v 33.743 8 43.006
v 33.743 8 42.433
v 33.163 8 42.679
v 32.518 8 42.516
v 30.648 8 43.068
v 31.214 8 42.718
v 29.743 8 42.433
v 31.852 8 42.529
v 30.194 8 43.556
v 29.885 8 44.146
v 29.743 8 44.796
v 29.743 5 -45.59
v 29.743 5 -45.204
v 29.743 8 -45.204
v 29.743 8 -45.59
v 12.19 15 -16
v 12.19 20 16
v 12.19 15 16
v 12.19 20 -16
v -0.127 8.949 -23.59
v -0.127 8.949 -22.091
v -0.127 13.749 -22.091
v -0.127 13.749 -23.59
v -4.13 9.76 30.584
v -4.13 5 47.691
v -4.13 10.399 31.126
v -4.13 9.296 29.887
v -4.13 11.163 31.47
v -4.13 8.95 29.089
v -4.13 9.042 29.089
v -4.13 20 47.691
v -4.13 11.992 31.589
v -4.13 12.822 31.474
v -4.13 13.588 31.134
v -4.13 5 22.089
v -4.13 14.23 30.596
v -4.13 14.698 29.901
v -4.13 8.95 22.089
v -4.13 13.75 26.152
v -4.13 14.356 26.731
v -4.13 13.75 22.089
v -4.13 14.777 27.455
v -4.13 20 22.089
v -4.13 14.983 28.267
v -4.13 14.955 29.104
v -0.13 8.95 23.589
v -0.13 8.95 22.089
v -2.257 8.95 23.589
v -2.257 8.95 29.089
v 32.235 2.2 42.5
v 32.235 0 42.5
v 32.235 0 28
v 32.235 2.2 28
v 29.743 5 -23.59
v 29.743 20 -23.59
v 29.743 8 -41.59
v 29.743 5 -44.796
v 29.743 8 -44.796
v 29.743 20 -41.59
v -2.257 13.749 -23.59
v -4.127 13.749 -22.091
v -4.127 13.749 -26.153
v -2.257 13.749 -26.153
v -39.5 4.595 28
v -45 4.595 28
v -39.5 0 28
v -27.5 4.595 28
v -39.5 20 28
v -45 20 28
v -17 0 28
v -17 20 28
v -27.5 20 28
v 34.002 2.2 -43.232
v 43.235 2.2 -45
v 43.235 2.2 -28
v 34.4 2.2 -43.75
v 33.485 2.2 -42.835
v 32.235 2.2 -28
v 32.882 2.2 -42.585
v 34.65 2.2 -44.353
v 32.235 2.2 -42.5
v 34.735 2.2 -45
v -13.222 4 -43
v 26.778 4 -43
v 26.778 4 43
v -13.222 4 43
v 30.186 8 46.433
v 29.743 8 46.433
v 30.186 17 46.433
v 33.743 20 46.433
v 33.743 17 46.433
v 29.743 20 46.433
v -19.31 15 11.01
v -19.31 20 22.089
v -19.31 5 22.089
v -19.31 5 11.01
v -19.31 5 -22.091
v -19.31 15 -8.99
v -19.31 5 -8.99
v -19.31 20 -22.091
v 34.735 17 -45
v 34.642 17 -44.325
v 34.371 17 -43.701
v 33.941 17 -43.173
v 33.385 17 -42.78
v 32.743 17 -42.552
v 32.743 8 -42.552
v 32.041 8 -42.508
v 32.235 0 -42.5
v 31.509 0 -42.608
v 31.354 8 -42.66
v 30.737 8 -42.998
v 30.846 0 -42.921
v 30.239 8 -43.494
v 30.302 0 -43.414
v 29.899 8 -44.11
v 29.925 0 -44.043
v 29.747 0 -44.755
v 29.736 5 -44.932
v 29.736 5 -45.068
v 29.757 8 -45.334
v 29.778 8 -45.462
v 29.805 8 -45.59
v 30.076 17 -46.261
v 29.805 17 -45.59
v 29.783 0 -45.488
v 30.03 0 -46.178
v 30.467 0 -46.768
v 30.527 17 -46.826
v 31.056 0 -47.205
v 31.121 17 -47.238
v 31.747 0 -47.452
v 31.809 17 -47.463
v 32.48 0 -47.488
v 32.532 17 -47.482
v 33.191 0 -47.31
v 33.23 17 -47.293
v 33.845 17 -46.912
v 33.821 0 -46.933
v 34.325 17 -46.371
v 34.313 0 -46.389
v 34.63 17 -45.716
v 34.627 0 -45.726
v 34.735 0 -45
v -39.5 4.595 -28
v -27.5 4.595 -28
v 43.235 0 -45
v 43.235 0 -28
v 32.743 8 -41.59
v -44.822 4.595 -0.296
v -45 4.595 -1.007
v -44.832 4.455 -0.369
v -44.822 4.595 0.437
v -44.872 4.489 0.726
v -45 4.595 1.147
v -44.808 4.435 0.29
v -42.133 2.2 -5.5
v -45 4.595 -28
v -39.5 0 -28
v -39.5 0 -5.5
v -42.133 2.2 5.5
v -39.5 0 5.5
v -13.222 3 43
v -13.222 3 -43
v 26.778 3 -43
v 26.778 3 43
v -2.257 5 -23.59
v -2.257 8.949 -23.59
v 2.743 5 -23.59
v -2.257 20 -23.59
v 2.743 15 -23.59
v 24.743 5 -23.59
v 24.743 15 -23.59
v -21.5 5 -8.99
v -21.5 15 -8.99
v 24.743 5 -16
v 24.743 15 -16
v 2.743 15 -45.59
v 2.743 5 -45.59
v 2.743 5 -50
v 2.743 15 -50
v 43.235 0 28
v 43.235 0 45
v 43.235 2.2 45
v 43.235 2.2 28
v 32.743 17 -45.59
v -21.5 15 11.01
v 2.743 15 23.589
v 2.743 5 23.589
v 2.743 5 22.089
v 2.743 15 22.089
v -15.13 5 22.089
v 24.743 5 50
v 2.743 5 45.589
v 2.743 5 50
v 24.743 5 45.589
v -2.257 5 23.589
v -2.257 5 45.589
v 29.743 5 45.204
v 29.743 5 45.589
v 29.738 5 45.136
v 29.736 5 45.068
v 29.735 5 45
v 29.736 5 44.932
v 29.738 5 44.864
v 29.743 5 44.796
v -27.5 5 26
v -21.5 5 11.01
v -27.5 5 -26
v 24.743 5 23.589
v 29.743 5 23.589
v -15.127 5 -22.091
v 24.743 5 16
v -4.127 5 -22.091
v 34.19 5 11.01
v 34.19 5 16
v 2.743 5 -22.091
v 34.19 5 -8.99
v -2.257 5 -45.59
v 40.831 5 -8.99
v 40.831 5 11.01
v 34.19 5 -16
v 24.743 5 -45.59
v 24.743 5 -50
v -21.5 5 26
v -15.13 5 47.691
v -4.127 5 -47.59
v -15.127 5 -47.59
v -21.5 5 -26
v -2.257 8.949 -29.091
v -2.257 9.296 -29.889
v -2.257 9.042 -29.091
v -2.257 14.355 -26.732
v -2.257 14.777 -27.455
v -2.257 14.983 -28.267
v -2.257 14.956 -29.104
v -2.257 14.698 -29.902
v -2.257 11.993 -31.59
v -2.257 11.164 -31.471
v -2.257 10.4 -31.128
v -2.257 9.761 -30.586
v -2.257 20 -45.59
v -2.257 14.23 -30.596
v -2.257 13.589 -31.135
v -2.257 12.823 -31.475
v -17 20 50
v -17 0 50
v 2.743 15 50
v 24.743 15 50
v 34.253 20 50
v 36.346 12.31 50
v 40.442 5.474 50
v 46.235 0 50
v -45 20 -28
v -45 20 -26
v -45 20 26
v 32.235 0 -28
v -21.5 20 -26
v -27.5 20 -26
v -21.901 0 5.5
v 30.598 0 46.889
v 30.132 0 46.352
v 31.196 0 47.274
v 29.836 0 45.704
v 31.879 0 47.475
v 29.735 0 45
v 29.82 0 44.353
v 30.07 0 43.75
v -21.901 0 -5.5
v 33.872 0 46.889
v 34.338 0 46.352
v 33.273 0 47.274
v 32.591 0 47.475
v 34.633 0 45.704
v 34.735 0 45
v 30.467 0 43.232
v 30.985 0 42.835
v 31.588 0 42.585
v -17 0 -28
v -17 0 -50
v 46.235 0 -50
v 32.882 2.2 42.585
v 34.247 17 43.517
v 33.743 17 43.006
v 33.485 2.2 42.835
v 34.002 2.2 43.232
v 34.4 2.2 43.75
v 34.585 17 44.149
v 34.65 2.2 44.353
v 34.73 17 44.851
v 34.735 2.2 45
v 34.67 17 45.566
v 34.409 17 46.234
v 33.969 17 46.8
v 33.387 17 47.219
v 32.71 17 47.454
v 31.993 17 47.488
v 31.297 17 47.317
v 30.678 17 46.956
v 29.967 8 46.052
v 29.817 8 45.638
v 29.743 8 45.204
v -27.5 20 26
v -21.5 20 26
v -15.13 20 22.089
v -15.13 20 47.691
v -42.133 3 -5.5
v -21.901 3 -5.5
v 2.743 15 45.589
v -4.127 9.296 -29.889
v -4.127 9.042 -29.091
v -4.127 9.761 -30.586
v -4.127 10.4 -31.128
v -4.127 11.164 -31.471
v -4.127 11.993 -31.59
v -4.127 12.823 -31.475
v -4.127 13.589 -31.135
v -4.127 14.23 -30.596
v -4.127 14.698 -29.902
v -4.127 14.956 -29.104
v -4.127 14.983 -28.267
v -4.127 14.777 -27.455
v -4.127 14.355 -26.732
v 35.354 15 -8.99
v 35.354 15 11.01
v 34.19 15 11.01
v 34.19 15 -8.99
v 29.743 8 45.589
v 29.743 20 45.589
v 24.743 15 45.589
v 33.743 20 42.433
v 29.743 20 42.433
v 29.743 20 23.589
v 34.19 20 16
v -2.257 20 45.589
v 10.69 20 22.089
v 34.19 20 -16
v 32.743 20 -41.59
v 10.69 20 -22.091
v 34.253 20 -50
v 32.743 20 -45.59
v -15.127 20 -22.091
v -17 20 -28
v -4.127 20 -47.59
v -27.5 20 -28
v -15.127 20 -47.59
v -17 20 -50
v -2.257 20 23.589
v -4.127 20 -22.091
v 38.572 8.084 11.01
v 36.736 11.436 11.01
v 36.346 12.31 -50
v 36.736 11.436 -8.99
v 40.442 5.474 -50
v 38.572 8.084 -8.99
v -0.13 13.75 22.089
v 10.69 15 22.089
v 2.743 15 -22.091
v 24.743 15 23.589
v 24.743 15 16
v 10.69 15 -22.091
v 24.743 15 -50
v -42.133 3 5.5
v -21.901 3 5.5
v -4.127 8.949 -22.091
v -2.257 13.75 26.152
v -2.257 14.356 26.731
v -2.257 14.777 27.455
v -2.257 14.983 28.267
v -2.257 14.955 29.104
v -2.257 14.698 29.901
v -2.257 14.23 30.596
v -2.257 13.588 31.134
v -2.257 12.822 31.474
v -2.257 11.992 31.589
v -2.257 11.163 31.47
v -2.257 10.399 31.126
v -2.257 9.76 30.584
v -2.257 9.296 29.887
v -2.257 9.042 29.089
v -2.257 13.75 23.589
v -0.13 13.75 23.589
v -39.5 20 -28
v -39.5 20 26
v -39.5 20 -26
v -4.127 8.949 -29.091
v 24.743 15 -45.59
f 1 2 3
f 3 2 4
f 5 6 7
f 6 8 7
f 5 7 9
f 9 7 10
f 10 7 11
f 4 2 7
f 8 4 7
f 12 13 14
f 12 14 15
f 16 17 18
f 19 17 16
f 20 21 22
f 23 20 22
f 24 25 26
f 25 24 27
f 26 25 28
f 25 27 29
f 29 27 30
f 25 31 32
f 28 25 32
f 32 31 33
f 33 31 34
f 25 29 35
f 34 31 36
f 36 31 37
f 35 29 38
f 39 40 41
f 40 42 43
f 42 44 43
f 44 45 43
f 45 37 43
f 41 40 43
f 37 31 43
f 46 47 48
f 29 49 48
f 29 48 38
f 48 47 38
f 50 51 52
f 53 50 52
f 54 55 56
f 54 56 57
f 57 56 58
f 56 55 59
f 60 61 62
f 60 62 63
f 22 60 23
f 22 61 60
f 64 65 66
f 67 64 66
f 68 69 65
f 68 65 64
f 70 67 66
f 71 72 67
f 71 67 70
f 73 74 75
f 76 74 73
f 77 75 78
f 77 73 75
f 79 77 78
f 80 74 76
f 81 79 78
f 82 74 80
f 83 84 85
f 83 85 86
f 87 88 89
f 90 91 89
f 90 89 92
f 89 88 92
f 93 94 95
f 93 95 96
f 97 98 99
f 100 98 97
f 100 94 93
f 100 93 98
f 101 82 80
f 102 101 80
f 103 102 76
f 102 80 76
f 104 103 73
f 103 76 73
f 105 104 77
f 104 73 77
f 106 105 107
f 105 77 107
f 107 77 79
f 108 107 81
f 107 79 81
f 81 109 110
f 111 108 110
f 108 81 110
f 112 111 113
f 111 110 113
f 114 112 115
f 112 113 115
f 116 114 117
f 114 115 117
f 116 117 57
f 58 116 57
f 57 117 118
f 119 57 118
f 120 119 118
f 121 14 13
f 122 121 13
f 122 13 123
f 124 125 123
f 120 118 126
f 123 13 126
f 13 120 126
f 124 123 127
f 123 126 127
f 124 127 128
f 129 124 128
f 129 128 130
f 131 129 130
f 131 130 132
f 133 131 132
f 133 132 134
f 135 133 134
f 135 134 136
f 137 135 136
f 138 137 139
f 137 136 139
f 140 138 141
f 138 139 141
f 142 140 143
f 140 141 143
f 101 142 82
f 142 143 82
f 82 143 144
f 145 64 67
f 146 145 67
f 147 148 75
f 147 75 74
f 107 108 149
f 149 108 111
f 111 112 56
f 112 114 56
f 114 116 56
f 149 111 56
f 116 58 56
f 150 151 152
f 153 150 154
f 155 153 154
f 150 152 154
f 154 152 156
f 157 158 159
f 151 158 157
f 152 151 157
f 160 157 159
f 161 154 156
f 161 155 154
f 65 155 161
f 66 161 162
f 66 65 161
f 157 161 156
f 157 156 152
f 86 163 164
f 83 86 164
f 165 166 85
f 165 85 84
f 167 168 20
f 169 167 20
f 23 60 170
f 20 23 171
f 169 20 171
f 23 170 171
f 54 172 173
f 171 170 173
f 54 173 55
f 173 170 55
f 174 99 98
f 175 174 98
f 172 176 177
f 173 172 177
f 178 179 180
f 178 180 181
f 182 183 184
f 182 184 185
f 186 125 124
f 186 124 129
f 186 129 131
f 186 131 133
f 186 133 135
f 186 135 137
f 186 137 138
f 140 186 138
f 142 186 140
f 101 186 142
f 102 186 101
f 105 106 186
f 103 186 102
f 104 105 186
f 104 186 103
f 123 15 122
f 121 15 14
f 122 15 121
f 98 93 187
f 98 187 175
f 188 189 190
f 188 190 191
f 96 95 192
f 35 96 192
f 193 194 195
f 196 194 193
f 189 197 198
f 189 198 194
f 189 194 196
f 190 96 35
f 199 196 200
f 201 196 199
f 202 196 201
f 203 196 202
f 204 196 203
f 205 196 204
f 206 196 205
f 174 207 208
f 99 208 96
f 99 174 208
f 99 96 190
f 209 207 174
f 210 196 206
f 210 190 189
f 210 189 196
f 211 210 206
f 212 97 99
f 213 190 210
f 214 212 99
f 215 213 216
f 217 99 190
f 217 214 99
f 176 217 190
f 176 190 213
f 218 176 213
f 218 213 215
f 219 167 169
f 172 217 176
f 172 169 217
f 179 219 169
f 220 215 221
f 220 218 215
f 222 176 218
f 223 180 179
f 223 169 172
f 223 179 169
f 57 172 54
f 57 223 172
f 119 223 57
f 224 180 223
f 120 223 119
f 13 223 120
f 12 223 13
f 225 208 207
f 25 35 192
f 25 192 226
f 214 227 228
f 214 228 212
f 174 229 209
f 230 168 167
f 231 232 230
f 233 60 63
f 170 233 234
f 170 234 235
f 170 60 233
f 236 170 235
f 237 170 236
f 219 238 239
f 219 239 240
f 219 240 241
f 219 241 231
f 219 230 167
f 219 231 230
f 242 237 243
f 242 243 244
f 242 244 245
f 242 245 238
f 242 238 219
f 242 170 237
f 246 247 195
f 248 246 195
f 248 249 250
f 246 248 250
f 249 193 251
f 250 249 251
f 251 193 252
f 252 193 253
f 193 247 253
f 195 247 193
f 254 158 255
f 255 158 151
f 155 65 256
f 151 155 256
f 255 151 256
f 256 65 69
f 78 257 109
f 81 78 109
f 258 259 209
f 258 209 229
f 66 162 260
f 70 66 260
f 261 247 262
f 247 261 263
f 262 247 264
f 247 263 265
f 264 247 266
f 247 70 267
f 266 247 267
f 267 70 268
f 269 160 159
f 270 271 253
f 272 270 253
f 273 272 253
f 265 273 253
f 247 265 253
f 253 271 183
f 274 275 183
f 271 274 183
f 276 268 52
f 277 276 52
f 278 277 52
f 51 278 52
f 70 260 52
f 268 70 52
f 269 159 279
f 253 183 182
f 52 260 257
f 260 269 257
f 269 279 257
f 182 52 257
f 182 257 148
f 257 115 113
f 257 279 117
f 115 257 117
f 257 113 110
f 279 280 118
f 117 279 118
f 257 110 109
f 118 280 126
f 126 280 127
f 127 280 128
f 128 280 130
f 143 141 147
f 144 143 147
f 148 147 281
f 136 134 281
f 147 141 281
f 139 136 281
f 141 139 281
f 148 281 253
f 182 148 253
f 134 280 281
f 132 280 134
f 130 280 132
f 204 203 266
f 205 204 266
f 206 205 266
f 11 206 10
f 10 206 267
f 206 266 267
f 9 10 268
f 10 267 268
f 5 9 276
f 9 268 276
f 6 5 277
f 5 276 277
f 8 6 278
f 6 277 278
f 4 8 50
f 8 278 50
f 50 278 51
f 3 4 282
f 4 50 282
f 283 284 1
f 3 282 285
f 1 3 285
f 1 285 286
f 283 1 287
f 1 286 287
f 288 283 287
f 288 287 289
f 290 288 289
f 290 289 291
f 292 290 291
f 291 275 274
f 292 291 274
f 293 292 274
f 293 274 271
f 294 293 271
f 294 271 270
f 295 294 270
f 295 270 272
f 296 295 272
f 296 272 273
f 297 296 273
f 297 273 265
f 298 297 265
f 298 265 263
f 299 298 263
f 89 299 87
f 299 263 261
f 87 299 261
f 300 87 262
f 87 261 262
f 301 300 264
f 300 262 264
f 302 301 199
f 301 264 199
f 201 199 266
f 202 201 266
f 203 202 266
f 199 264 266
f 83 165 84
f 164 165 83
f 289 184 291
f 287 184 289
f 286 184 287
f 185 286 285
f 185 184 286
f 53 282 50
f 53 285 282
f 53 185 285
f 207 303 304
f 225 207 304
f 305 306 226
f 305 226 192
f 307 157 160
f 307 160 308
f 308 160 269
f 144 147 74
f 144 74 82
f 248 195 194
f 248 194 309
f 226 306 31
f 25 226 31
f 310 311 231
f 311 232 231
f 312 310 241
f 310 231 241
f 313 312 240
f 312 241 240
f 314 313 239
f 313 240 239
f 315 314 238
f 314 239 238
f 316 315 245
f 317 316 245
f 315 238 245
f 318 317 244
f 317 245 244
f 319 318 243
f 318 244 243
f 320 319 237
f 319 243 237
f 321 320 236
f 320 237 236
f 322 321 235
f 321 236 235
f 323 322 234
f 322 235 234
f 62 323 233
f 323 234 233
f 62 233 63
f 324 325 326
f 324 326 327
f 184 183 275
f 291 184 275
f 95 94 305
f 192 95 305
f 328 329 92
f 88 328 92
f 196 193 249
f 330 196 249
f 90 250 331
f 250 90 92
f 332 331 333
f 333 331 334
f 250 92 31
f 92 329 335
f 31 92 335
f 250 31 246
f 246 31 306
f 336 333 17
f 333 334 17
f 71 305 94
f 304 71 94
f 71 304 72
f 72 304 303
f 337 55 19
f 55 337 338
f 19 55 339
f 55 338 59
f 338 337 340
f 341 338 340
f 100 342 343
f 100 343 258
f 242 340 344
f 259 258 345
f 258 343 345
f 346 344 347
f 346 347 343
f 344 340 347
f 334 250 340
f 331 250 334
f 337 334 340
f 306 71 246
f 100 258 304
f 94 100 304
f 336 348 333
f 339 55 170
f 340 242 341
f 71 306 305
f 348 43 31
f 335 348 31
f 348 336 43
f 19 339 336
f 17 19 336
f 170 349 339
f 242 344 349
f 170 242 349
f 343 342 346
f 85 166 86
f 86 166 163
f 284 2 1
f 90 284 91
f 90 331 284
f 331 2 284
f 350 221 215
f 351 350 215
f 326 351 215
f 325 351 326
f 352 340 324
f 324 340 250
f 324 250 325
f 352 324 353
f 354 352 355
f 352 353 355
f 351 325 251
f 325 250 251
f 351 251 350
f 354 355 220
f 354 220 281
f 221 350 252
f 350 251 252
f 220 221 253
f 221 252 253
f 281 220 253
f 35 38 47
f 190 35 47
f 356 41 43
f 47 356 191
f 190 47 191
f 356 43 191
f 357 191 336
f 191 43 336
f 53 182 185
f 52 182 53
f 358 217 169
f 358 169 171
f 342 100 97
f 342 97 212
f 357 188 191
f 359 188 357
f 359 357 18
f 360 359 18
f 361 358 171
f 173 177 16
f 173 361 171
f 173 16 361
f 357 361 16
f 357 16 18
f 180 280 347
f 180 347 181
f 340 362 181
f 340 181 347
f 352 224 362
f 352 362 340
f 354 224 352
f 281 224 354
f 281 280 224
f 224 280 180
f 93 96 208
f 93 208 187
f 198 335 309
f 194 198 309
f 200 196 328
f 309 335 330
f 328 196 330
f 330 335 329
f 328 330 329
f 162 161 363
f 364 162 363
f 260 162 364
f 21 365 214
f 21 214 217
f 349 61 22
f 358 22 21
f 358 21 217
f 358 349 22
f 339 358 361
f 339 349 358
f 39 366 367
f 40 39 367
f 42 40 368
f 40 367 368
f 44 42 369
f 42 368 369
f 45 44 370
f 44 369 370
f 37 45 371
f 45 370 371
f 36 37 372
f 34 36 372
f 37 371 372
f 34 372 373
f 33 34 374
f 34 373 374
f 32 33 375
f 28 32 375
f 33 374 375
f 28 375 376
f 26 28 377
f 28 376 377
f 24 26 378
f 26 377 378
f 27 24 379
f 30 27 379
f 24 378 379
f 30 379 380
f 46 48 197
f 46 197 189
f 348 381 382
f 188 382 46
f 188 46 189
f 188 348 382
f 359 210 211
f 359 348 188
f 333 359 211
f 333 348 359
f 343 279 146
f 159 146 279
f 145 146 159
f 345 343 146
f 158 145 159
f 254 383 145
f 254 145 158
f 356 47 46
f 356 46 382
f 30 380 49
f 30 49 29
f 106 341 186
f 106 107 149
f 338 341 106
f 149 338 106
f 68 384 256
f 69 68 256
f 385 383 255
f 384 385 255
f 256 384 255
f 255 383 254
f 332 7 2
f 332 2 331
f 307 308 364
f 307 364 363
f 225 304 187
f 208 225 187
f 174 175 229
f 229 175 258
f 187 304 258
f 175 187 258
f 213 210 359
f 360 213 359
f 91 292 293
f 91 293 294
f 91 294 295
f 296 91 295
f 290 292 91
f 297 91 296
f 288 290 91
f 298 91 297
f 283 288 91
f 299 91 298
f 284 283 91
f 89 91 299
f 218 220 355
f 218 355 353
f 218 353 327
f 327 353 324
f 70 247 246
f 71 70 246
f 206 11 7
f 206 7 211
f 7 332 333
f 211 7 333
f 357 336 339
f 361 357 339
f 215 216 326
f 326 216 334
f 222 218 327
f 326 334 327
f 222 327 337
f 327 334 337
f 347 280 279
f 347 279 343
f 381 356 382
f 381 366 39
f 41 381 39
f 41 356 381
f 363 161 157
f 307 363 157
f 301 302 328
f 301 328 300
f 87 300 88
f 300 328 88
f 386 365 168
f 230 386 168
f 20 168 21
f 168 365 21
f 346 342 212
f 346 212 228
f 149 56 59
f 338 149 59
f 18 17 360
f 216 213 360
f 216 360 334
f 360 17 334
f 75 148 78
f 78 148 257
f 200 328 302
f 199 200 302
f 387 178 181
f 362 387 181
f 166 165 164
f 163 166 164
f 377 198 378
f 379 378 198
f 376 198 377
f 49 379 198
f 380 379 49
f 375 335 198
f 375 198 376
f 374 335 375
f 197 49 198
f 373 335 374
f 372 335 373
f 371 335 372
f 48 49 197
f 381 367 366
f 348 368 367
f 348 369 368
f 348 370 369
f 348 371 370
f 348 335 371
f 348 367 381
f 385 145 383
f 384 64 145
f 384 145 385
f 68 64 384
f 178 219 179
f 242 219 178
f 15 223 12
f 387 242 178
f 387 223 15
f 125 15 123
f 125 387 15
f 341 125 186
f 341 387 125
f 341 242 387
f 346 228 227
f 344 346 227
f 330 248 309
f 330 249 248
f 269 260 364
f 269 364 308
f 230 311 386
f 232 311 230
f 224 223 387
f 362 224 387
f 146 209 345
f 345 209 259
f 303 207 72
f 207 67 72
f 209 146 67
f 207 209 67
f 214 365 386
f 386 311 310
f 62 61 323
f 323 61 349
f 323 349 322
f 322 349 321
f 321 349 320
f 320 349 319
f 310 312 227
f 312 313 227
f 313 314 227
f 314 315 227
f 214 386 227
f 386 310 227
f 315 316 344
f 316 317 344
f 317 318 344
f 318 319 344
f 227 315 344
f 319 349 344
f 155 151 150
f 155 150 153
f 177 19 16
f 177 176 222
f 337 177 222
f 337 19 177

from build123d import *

# Parameters (mm, degrees)
SKETCH1_W           = 100
SKETCH1_H           = 100
BOSS_EXTRUDE2_DEPTH = 40
SKETCH3_W           = 20
SKETCH3_H           = 10
CUT_EXTRUDE3_DEPTH  = 100
SKETCH4_R           = 29.179887526
CUT_EXTRUDE5_DEPTH  = 100
SKETCH5_W           = 60
SKETCH5_H           = 20
CUT_EXTRUDE6_DEPTH  = 100
SKETCH6_W           = 22
SKETCH6_H           = 32
CUT_EXTRUDE7_DEPTH  = 15
SKETCH7_W           = 22
SKETCH7_H           = 10
CUT_EXTRUDE9_DEPTH  = 100
SKETCH9_W           = 32
SKETCH9_H           = 22
CUT_EXTRUDE10_DEPTH = 15
SKETCH10_W          = 32
SKETCH10_H          = 22
CUT_EXTRUDE11_DEPTH = 15
SKETCH11_W          = 33
SKETCH11_H          = 33
CUT_EXTRUDE13_DEPTH = 22
SKETCH12_W          = 33
SKETCH12_H          = 33
CUT_EXTRUDE14_DEPTH = 22
SKETCH13_W          = 30
SKETCH13_H          = 20
CUT_EXTRUDE15_DEPTH = 100
SKETCH14_W          = 12
SKETCH14_H          = 16
CUT_EXTRUDE17_DEPTH = 80
SKETCH15_W          = 24
SKETCH15_H          = 52
CUT_EXTRUDE18_DEPTH = 15
SKETCH16_W          = 30
SKETCH16_H          = 44.18
CUT_EXTRUDE19_DEPTH = 15
SKETCH17_W          = 11
SKETCH17_H          = 26
CUT_EXTRUDE20_DEPTH = 15
SKETCH18_W          = 11
SKETCH18_H          = 26
CUT_EXTRUDE22_DEPTH = 15
SKETCH19_W          = 11
SKETCH19_H          = 17
CUT_EXTRUDE26_DEPTH = 2.2
SKETCH20_R          = 2.5
CUT_EXTRUDE32_DEPTH = 17
SKETCH21_W          = 4
SKETCH21_H          = 12
CUT_EXTRUDE33_DEPTH = 4
SKETCH23_W          = 11
SKETCH23_H          = 17
CUT_EXTRUDE34_DEPTH = 2.2
SKETCH24_R          = 2.5
CUT_EXTRUDE35_DEPTH = 17
SKETCH25_W          = 4
SKETCH25_H          = 12
CUT_EXTRUDE36_DEPTH = 3
SKETCH26_R          = 3
CUT_EXTRUDE37_DEPTH = 3
SKETCH27_R          = 3
CUT_EXTRUDE38_DEPTH = 3
SKETCH28_W          = 17
SKETCH28_H          = 11
CUT_EXTRUDE39_DEPTH = 2.2
SKETCH29_R          = 3
CUT_EXTRUDE40_DEPTH = 4
SKETCH30_W          = 4
SKETCH30_H          = 4.8
CUT_EXTRUDE43_DEPTH = 7
SKETCH31_W          = 4
SKETCH31_H          = 4.8
CUT_EXTRUDE44_DEPTH = 7
CUT_EXTRUDE45_DEPTH = 100
SKETCH34_W          = 5
SKETCH34_H          = 20
CUT_EXTRUDE46_DEPTH = 100
CUT_EXTRUDE47_DEPTH = 100
SKETCH36_W          = 5.5
SKETCH36_H          = 15.404877169
BOSS_EXTRUDE3_DEPTH = 55
SKETCH37_W          = 20.232210009
SKETCH37_H          = 11
CUT_EXTRUDE48_DEPTH = 3
SKETCH38_W          = 40
SKETCH38_H          = 86
CUT_EXTRUDE53_DEPTH = 1


with BuildPart() as part:
    # Sketch1 → Boss-Extrude2 (new body)
    with BuildSketch(Plane(origin=(0, 0, 0), x_dir=(1, 0, 0), z_dir=(0, 1, 0))):
        Rectangle(SKETCH1_W, SKETCH1_H)
    extrude(amount=BOSS_EXTRUDE2_DEPTH)

    # Sketch3 → Cut-Extrude3 (cut)
    with BuildSketch(Plane(origin=(50, 0, 0), x_dir=(0, 0, -1), z_dir=(1, 0, 0))):
        with Locations((-1.010205144, 10)):
            Rectangle(SKETCH3_W, SKETCH3_H)
    extrude(amount=-CUT_EXTRUDE3_DEPTH, mode=Mode.SUBTRACT)

    # Sketch4 → Cut-Extrude5 (cut)
    with BuildSketch(Plane.XY.offset(50)):
        with Locations((63.191438408, 23.747323898)):
            Circle(SKETCH4_R)
    extrude(amount=-CUT_EXTRUDE5_DEPTH, mode=Mode.SUBTRACT)

    # Sketch5 → Cut-Extrude6 (cut)
    with BuildSketch(Plane.XY.offset(50)):
        with Locations((8.956827713, 30)):
            Rectangle(SKETCH5_W, SKETCH5_H)
    extrude(amount=-CUT_EXTRUDE6_DEPTH, mode=Mode.SUBTRACT)

    # Sketch6 → Cut-Extrude7 (cut)
    with BuildSketch(Plane(origin=(0, 20, 0), x_dir=(1, 0, 0), z_dir=(0, 1, 0))):
        with Locations((23.190442589, 0)):
            Rectangle(SKETCH6_W, SKETCH6_H)
    extrude(amount=-CUT_EXTRUDE7_DEPTH, mode=Mode.SUBTRACT)

    # Sketch7 → Cut-Extrude9 (cut)
    with BuildSketch(Plane.XY.offset(50)):
        with Locations((13.743053617, 10)):
            Rectangle(SKETCH7_W, SKETCH7_H)
    extrude(amount=-CUT_EXTRUDE9_DEPTH, mode=Mode.SUBTRACT)

    # Sketch9 → Cut-Extrude10 (cut)
    with BuildSketch(Plane(origin=(0, 20, 0), x_dir=(1, 0, 0), z_dir=(0, 1, 0))):
        with Locations((13.743053617, -34.588860887)):
            Rectangle(SKETCH9_W, SKETCH9_H)
    extrude(amount=-CUT_EXTRUDE10_DEPTH, mode=Mode.SUBTRACT)

    # Sketch10 → Cut-Extrude11 (cut)
    with BuildSketch(Plane(origin=(0, 20, 0), x_dir=(1, 0, 0), z_dir=(0, 1, 0))):
        with Locations((13.743053617, 34.59)):
            Rectangle(SKETCH10_W, SKETCH10_H)
    extrude(amount=-CUT_EXTRUDE11_DEPTH, mode=Mode.SUBTRACT)

    # Sketch11 → Cut-Extrude13 (cut)
    with BuildSketch(Plane.XY.offset(50)):
        with Locations((-33.5, 16.5)):
            Rectangle(SKETCH11_W, SKETCH11_H)
    extrude(amount=-CUT_EXTRUDE13_DEPTH, mode=Mode.SUBTRACT)

    # Sketch12 → Cut-Extrude14 (cut)
    with BuildSketch(Plane(origin=(0, 0, -50), x_dir=(-1, 0, 0), z_dir=(0, 0, -1))):
        with Locations((33.5, 16.5)):
            Rectangle(SKETCH12_W, SKETCH12_H)
    extrude(amount=-CUT_EXTRUDE14_DEPTH, mode=Mode.SUBTRACT)

    # Sketch13 → Cut-Extrude15 (cut)
    with BuildSketch(Plane(origin=(0, 0, -50), x_dir=(-1, 0, 0), z_dir=(0, 0, -1))):
        with Locations((36.043172287, 30)):
            Rectangle(SKETCH13_W, SKETCH13_H)
    extrude(amount=-CUT_EXTRUDE15_DEPTH, mode=Mode.SUBTRACT)

    # Sketch14 → Cut-Extrude17 (cut)
    with BuildSketch(Plane.XY.offset(28)):
        with Locations((-33.5, 12.595122831)):
            Rectangle(SKETCH14_W, SKETCH14_H)
    extrude(amount=-CUT_EXTRUDE17_DEPTH, mode=Mode.SUBTRACT)

    # Sketch15 → Cut-Extrude18 (cut)
    with BuildSketch(Plane(origin=(0, 20, 0), x_dir=(1, 0, 0), z_dir=(0, 1, 0))):
        with Locations((-33.5, 0)):
            Rectangle(SKETCH15_W, SKETCH15_H)
    extrude(amount=-CUT_EXTRUDE18_DEPTH, mode=Mode.SUBTRACT)

    # Sketch16 → Cut-Extrude19 (cut)
    with BuildSketch(Plane(origin=(0, 20, 0), x_dir=(1, 0, 0), z_dir=(0, 1, 0))):
        with Locations((-4.309557411, 0.001139113)):
            Rectangle(SKETCH16_W, SKETCH16_H)
    extrude(amount=-CUT_EXTRUDE19_DEPTH, mode=Mode.SUBTRACT)

    # Sketch17 → Cut-Extrude20 (cut)
    with BuildSketch(Plane(origin=(0, 20, 0), x_dir=(1, 0, 0), z_dir=(0, 1, 0))):
        with Locations((-9.626946383, 34.59)):
            Rectangle(SKETCH17_W, SKETCH17_H)
    extrude(amount=-CUT_EXTRUDE20_DEPTH, mode=Mode.SUBTRACT)

    # Sketch18 → Cut-Extrude22 (cut)
    with BuildSketch(Plane(origin=(0, 20, 0), x_dir=(1, 0, 0), z_dir=(0, 1, 0))):
        with Locations((-9.63, -34.691148393)):
            Rectangle(SKETCH18_W, SKETCH18_H)
    extrude(amount=-CUT_EXTRUDE22_DEPTH, mode=Mode.SUBTRACT)

    # Sketch19 → Cut-Extrude26 (cut)
    with BuildSketch(Plane(origin=(0, 0, 0), x_dir=(-1, 0, 0), z_dir=(0, -1, 0))):
        with Locations((-37.734715737, -36.5)):
            Rectangle(SKETCH19_W, SKETCH19_H)
    extrude(amount=-CUT_EXTRUDE26_DEPTH, mode=Mode.SUBTRACT)

    # Sketch20 → Cut-Extrude32 (cut)
    with BuildSketch(Plane(origin=(0, 0, 0), x_dir=(-1, 0, 0), z_dir=(0, -1, 0))):
        with Locations((-32.234715737, -45)):
            Circle(SKETCH20_R)
    extrude(amount=-CUT_EXTRUDE32_DEPTH, mode=Mode.SUBTRACT)

    # Sketch21 → Cut-Extrude33 (cut)
    with BuildSketch(Plane.ZY.offset(-29.743053617)):
        with Locations((44.433350435, 14)):
            Rectangle(SKETCH21_W, SKETCH21_H)
    extrude(amount=-CUT_EXTRUDE33_DEPTH, mode=Mode.SUBTRACT)

    # Sketch23 → Cut-Extrude34 (cut)
    with BuildSketch(Plane(origin=(0, 0, 0), x_dir=(-1, 0, 0), z_dir=(0, -1, 0))):
        with Locations((-37.734715737, 36.5)):
            Rectangle(SKETCH23_W, SKETCH23_H)
    extrude(amount=-CUT_EXTRUDE34_DEPTH, mode=Mode.SUBTRACT)

    # Sketch24 → Cut-Extrude35 (cut)
    with BuildSketch(Plane.XZ):
        with Locations((32.234715737, -45)):
            Circle(SKETCH24_R)
    extrude(amount=-CUT_EXTRUDE35_DEPTH, mode=Mode.SUBTRACT)

    # Sketch25 → Cut-Extrude36 (cut)
    with BuildSketch(Plane.ZY.offset(-29.743053617)):
        with Locations((-43.59, 14)):
            Rectangle(SKETCH25_W, SKETCH25_H)
    extrude(amount=-CUT_EXTRUDE36_DEPTH, mode=Mode.SUBTRACT)

    # Sketch26 → Cut-Extrude37 (cut)
    with BuildSketch(Plane(origin=(-2.256946383, 0, 0), x_dir=(0, 0, -1), z_dir=(1, 0, 0))):
        with Locations((-28.588860887, 12)):
            Circle(SKETCH26_R)
    extrude(amount=-CUT_EXTRUDE37_DEPTH, mode=Mode.SUBTRACT)

    # Sketch27 → Cut-Extrude38 (cut)
    with BuildSketch(Plane(origin=(-2.256946383, 0, 0), x_dir=(0, 0, -1), z_dir=(1, 0, 0))):
        with Locations((28.59, 12)):
            Circle(SKETCH27_R)
    extrude(amount=-CUT_EXTRUDE38_DEPTH, mode=Mode.SUBTRACT)

    # Sketch28 → Cut-Extrude39 (cut)
    with BuildSketch(Plane.XZ):
        with Locations((-40.055873336, 0)):
            Rectangle(SKETCH28_W, SKETCH28_H)
    extrude(amount=-CUT_EXTRUDE39_DEPTH, mode=Mode.SUBTRACT)

    # Sketch29 → Cut-Extrude40 (cut)
    with BuildSketch(Plane(origin=(0, 2.2, 0), x_dir=(-1, 0, 0), z_dir=(0, -1, 0))):
        with Locations((47.799920192, -0.070169229)):
            Circle(SKETCH29_R)
    extrude(amount=-CUT_EXTRUDE40_DEPTH, mode=Mode.SUBTRACT)

    # Sketch30 → Cut-Extrude43 (cut)
    with BuildSketch(Plane.XY.offset(-22.091139113)):
        with Locations((-2.126946383, 11.349361099)):
            Rectangle(SKETCH30_W, SKETCH30_H)
    extrude(amount=-CUT_EXTRUDE43_DEPTH, mode=Mode.SUBTRACT)

    # Sketch31 → Cut-Extrude44 (cut)
    with BuildSketch(Plane(origin=(0, 0, 22.088860887), x_dir=(-1, 0, 0), z_dir=(0, 0, -1))):
        with Locations((2.13, 11.35)):
            Rectangle(SKETCH31_W, SKETCH31_H)
    extrude(amount=-CUT_EXTRUDE44_DEPTH, mode=Mode.SUBTRACT)

    # Sketch33 → Cut-Extrude45 (cut)
    with BuildSketch(Plane(origin=(0, 0, -28), x_dir=(-1, 0, 0), z_dir=(0, 0, -1))):
        Polygon((45, 0), (50, 5), (50, 0), align=None)
    extrude(amount=-CUT_EXTRUDE45_DEPTH, mode=Mode.SUBTRACT)

    # Sketch34 → Cut-Extrude46 (cut)
    with BuildSketch(Plane.XY.offset(28)):
        with Locations((-47.5, 10)):
            Rectangle(SKETCH34_W, SKETCH34_H)
    extrude(amount=-CUT_EXTRUDE46_DEPTH, mode=Mode.SUBTRACT)

    # Sketch35 → Cut-Extrude47 (cut)
    with BuildSketch(Plane.XY.offset(28)):
        Polygon((-45, 4.595122831), (-39.5, 0), (-45, 0), align=None)
    extrude(amount=-CUT_EXTRUDE47_DEPTH, mode=Mode.SUBTRACT)

    # Sketch36 → Boss-Extrude3 (add)
    with BuildSketch(Plane.XY.offset(28)):
        with Locations((-42.25, 12.297561416)):
            Rectangle(SKETCH36_W, SKETCH36_H)
    extrude(amount=-BOSS_EXTRUDE3_DEPTH)

    # Sketch37 → Cut-Extrude48 (cut)
    with BuildSketch(Plane(origin=(0, 0, 0), x_dir=(-1, 0, 0), z_dir=(0, -1, 0))):
        with Locations((32.017121667, 0)):
            Rectangle(SKETCH37_W, SKETCH37_H)
    extrude(amount=-CUT_EXTRUDE48_DEPTH, mode=Mode.SUBTRACT)

    # Sketch38 → Cut-Extrude53 (cut)
    with BuildSketch(Plane(origin=(0, 3, 0), x_dir=(-1, 0, 0), z_dir=(0, -1, 0))):
        with Locations((-6.777878387, 0)):
            Rectangle(SKETCH38_W, SKETCH38_H)
    extrude(amount=-CUT_EXTRUDE53_DEPTH, mode=Mode.SUBTRACT)


solid = part.part
